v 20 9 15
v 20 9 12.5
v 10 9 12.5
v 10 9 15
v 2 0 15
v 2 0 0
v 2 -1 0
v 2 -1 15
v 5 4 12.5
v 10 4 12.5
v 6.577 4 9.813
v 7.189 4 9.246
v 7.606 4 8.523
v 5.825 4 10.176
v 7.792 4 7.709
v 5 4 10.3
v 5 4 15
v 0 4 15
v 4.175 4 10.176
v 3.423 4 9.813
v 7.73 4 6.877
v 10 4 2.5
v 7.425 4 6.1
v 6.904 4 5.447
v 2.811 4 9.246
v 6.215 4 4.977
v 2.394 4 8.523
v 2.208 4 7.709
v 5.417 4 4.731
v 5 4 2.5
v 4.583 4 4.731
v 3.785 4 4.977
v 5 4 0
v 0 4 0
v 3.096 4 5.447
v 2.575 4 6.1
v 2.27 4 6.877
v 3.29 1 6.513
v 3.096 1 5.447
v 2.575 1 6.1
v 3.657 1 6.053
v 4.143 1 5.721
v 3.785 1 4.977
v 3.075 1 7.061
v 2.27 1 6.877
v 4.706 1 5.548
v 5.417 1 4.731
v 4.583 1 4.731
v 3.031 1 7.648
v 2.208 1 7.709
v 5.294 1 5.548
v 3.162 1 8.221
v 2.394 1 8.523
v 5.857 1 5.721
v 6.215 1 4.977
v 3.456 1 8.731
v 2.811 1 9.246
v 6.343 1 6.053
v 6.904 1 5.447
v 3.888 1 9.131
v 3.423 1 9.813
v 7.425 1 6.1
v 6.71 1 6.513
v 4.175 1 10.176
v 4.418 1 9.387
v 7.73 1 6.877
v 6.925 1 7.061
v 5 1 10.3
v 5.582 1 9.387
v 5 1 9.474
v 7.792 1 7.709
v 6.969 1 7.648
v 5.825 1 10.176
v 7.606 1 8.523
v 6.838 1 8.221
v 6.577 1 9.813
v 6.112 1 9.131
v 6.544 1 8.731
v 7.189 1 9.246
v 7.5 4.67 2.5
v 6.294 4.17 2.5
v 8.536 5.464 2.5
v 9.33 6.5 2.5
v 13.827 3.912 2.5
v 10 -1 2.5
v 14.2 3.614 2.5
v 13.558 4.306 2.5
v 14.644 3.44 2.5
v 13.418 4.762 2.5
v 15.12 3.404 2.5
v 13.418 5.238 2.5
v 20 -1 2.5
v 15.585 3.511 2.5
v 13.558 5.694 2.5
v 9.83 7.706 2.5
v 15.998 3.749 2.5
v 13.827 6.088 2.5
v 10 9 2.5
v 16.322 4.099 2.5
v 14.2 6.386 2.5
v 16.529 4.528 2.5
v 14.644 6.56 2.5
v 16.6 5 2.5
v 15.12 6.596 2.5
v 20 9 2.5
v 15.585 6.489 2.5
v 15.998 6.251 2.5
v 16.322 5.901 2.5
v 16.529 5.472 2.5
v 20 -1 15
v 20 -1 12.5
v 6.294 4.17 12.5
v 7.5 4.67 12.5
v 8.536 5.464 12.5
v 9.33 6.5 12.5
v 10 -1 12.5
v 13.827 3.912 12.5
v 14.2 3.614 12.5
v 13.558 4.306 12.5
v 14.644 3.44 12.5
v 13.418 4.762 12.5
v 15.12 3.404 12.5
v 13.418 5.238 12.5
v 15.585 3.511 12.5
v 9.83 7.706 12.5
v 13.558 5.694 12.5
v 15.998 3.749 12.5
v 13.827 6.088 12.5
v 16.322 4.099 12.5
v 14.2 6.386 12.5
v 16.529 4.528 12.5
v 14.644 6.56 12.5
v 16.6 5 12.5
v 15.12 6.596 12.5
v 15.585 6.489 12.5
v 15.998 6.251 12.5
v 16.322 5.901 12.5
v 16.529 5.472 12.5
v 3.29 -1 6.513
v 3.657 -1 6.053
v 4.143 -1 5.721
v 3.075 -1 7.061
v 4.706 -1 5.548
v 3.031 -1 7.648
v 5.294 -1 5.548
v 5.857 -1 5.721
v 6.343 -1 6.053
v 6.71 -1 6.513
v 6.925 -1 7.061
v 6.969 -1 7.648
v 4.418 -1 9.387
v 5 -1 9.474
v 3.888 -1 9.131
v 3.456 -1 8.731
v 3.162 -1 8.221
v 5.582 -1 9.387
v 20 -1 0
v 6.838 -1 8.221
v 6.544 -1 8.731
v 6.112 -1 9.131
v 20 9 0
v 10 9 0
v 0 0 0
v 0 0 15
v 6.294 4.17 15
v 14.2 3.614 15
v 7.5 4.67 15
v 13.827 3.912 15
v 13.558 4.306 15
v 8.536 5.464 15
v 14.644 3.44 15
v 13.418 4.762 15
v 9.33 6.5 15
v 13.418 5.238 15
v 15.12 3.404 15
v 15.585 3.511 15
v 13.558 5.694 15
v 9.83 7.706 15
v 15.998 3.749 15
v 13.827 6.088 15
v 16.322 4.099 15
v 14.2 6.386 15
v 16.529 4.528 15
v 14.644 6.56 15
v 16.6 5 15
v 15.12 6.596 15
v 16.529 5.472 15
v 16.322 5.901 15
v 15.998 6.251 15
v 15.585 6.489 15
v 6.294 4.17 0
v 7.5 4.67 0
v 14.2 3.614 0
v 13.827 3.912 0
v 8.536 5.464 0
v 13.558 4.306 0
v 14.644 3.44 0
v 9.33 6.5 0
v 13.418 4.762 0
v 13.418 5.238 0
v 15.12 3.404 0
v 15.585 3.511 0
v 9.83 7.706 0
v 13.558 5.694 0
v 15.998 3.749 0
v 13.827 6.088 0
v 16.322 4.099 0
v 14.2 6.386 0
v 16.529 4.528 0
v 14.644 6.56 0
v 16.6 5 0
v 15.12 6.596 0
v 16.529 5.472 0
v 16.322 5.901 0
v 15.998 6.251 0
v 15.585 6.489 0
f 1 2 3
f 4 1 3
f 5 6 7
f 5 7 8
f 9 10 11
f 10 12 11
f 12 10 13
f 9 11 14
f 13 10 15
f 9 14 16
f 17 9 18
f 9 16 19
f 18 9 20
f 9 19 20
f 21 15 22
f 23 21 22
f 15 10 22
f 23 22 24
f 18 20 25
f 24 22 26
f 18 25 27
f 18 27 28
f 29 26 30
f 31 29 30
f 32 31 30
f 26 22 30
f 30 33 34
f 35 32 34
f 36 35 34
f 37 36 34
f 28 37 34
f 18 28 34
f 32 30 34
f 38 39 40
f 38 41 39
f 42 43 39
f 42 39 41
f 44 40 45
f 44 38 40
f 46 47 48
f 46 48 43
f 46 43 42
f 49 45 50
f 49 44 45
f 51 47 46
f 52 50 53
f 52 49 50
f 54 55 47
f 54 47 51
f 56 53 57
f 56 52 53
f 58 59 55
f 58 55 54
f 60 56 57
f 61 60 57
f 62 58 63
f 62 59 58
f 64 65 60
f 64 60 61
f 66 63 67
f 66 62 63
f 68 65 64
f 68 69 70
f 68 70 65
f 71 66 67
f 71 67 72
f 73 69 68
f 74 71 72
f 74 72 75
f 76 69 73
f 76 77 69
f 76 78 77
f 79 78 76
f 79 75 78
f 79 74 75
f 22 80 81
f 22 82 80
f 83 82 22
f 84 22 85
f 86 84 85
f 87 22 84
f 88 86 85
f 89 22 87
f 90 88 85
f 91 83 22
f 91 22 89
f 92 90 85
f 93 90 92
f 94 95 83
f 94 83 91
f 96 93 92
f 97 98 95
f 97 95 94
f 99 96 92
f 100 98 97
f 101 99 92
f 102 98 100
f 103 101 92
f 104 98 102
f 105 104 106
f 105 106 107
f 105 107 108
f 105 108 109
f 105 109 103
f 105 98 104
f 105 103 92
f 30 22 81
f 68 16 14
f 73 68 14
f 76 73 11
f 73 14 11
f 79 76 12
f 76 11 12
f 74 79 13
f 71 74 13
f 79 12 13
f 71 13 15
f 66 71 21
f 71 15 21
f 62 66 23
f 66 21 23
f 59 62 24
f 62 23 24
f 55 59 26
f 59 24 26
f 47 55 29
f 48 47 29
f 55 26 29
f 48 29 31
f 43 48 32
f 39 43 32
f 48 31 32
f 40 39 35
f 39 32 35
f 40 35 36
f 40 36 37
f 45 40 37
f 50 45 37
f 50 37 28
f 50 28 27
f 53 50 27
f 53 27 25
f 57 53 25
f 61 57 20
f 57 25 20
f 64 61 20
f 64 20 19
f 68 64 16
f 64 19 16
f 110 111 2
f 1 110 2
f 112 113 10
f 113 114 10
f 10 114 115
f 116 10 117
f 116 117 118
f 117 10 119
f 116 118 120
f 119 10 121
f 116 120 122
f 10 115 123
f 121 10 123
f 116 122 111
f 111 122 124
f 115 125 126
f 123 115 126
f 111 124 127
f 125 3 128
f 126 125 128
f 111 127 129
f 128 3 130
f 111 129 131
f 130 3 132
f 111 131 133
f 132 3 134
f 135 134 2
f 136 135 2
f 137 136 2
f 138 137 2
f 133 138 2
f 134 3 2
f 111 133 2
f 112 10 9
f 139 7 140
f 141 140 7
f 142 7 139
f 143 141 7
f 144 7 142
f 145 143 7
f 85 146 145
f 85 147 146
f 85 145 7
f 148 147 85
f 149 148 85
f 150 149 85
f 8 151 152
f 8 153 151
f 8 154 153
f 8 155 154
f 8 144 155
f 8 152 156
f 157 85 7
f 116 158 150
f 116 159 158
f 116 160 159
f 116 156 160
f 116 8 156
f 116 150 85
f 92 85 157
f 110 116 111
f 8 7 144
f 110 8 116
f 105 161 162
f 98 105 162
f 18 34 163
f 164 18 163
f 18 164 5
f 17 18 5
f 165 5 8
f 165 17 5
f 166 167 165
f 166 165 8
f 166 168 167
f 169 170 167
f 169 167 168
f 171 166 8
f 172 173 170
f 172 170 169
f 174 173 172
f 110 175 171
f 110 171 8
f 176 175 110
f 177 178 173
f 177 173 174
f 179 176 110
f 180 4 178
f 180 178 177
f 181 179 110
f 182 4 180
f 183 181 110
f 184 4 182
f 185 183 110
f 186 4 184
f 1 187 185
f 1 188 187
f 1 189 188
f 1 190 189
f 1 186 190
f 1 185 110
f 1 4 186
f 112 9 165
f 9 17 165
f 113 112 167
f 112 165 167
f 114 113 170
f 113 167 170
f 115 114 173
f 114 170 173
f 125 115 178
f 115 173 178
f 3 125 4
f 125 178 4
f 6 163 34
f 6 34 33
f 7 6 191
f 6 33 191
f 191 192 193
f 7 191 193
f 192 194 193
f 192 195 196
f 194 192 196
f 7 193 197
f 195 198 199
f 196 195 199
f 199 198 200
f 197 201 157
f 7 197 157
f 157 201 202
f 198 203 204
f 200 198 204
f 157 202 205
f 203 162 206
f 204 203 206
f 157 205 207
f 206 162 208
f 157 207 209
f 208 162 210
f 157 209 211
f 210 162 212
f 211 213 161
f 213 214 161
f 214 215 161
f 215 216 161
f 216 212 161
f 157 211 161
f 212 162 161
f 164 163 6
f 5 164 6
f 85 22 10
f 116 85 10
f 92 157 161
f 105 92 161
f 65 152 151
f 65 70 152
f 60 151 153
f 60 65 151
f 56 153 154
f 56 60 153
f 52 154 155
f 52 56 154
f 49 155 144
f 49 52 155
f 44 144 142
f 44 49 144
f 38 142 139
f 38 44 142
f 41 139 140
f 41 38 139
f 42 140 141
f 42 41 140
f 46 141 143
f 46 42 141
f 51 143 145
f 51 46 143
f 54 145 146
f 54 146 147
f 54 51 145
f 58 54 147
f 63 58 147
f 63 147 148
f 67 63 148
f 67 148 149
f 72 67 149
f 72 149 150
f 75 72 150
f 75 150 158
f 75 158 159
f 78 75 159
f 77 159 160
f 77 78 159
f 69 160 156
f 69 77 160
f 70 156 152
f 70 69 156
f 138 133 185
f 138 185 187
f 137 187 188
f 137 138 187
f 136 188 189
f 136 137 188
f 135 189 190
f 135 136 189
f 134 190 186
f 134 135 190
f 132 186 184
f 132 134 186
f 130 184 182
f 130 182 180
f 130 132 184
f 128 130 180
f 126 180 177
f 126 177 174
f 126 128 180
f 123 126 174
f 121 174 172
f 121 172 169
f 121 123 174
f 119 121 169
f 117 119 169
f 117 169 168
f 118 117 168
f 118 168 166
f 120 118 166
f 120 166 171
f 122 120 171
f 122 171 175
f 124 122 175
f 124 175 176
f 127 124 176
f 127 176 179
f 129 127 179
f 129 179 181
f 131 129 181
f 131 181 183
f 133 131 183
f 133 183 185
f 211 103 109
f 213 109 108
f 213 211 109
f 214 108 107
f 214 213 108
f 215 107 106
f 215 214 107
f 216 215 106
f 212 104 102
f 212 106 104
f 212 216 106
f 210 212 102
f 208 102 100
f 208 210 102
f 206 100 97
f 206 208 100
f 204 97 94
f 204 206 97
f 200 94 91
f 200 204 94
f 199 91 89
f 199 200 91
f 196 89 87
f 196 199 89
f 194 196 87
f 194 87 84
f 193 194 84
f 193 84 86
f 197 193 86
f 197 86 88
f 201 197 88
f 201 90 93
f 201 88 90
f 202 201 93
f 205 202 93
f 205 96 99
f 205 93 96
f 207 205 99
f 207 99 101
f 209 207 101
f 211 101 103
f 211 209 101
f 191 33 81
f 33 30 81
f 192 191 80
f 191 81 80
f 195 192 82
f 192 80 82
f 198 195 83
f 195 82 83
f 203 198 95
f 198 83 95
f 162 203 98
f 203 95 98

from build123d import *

# Parameters (mm, degrees)
CROQUIS1_R              = 1.6
SALIENTE_EXTRUIR1_DEPTH = 15
CROQUIS2_W              = 10
CROQUIS2_H              = 10
CORTAR_EXTRUIR1_DEPTH   = 20
REDONDEO1_R             = 5
CROQUIS3_R              = 1.974471168
CORTAR_EXTRUIR2_DEPTH   = 11.2
CROQUIS4_R              = 2.8
CORTAR_EXTRUIR3_DEPTH   = 3
CROQUIS6_W              = 8
CROQUIS6_H              = 15
CROQUIS6_R              = 1.974471168
SALIENTE_EXTRUIR2_DEPTH = 1


with BuildPart() as part:
    # Croquis1 → Saliente-Extruir1 (new body)
    with BuildSketch(Plane.XY):
        Polygon((0, 0), (10, 0), (10, -1), (20, -1), (20, 0), (20, 4), (20, 9), (10, 9), (10, 4), (0, 4), align=None)
        with Locations((15, 5)):
            Circle(CROQUIS1_R, mode=Mode.SUBTRACT)
    extrude(amount=SALIENTE_EXTRUIR1_DEPTH)

    # Croquis2 → Cortar-Extruir1 (cut)
    with BuildSketch(Plane(origin=(0, 9, 0), x_dir=(1, 0, 0), z_dir=(0, 1, 0))):
        with Locations((15, -7.5)):
            Rectangle(CROQUIS2_W, CROQUIS2_H)
    extrude(amount=-CORTAR_EXTRUIR1_DEPTH, mode=Mode.SUBTRACT)

    # Redondeo1
    redondeo1_edges = [part.edges().sort_by_distance(p)[0] for p in [
        (10, 4, 1.25),
        (10, 4, 13.75),
    ]]
    fillet(redondeo1_edges, radius=REDONDEO1_R - 0.0001)  # a hair under: the kernel refuses the full size

    # Croquis3 → Cortar-Extruir2 (cut)
    with BuildSketch(Plane(origin=(0, 4, 0), x_dir=(1, 0, 0), z_dir=(0, 1, 0))):
        with Locations(Location((5, -7.5, 0), (0, 0, 270))):
            Circle(CROQUIS3_R)
    extrude(amount=-CORTAR_EXTRUIR2_DEPTH, mode=Mode.SUBTRACT)

    # Croquis4 → Cortar-Extruir3 (cut)
    with BuildSketch(Plane(origin=(0, 4, 0), x_dir=(1, 0, 0), z_dir=(0, 1, 0))):
        with Locations(Location((5, -7.5, 0), (0, 0, 270))):
            Circle(CROQUIS4_R)
    extrude(amount=-CORTAR_EXTRUIR3_DEPTH, mode=Mode.SUBTRACT)

    # Croquis6 → Saliente-Extruir2 (add)
    with BuildSketch(Plane.XZ):
        with Locations((6, 7.5)):
            Rectangle(CROQUIS6_W, CROQUIS6_H)
        with Locations(Location((5, 7.5, 0), (0, 0, 90))):
            Circle(CROQUIS6_R, mode=Mode.SUBTRACT)
    extrude(amount=SALIENTE_EXTRUIR2_DEPTH)


solid = part.part
